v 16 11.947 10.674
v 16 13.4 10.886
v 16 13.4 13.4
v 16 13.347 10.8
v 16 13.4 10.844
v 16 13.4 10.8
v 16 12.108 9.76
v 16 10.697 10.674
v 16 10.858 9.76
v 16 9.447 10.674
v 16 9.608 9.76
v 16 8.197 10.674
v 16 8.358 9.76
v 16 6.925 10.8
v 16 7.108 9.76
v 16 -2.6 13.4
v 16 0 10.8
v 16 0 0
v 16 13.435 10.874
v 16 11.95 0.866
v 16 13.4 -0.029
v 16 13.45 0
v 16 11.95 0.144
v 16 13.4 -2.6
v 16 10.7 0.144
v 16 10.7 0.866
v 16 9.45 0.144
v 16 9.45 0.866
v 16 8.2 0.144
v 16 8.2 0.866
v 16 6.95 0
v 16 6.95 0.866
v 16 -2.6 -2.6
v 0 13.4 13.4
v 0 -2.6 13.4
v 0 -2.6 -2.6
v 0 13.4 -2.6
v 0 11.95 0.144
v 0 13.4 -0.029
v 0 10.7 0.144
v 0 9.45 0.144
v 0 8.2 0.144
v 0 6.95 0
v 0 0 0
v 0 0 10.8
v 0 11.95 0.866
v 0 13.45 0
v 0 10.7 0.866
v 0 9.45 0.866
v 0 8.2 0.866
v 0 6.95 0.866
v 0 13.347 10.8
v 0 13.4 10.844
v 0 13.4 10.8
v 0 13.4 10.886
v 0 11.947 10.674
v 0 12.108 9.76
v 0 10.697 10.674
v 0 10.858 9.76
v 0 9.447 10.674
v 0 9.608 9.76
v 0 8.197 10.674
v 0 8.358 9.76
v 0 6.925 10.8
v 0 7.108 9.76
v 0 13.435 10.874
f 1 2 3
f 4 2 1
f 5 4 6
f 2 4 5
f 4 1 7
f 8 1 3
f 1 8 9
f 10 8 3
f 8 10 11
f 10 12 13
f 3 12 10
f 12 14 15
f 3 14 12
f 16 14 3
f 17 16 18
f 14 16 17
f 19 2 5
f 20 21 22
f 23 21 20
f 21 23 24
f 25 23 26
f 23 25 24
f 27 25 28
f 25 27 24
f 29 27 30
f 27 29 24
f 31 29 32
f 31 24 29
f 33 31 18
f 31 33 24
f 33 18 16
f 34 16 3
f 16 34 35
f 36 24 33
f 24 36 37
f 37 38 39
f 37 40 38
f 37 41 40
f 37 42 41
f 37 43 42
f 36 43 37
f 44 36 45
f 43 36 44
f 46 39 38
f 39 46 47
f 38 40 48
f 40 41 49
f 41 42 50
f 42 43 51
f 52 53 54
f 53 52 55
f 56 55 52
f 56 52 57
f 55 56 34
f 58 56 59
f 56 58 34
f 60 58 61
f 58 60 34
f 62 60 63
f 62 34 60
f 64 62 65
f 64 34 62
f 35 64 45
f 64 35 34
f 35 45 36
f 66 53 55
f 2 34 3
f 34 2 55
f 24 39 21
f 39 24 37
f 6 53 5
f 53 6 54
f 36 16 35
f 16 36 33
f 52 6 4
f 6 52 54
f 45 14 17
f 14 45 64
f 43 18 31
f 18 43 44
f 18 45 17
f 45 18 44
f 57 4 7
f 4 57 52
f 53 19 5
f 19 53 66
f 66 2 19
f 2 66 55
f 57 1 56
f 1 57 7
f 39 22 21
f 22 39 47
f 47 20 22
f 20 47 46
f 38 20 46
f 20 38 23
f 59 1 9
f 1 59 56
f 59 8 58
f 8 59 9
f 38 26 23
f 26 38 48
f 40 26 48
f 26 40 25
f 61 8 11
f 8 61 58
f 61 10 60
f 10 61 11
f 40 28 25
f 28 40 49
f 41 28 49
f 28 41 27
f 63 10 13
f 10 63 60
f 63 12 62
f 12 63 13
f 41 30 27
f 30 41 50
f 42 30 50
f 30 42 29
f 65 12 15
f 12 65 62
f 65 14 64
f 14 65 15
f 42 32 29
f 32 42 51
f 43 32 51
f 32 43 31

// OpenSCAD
diff=16-10.8;

difference() {
    translate([0,-diff/2,-diff/2]) cube([16,16,16]);
    translate([-54/2,0,0]) cube([54,85.8,10.8]);
}

module tooth(d=20) {
    rotate([0,90,0]) rotate(-d) cylinder(r=1,h=16,$fn=1);
}

for (i = [0 : 1.25 : 5] ) {
    translate([0,16-diff/2-0.95,16-diff-.1]) translate([0,-i,0]) tooth();
    translate([0,16-diff/2-0.95,]) translate([0,-i,0]) tooth(30);
}
